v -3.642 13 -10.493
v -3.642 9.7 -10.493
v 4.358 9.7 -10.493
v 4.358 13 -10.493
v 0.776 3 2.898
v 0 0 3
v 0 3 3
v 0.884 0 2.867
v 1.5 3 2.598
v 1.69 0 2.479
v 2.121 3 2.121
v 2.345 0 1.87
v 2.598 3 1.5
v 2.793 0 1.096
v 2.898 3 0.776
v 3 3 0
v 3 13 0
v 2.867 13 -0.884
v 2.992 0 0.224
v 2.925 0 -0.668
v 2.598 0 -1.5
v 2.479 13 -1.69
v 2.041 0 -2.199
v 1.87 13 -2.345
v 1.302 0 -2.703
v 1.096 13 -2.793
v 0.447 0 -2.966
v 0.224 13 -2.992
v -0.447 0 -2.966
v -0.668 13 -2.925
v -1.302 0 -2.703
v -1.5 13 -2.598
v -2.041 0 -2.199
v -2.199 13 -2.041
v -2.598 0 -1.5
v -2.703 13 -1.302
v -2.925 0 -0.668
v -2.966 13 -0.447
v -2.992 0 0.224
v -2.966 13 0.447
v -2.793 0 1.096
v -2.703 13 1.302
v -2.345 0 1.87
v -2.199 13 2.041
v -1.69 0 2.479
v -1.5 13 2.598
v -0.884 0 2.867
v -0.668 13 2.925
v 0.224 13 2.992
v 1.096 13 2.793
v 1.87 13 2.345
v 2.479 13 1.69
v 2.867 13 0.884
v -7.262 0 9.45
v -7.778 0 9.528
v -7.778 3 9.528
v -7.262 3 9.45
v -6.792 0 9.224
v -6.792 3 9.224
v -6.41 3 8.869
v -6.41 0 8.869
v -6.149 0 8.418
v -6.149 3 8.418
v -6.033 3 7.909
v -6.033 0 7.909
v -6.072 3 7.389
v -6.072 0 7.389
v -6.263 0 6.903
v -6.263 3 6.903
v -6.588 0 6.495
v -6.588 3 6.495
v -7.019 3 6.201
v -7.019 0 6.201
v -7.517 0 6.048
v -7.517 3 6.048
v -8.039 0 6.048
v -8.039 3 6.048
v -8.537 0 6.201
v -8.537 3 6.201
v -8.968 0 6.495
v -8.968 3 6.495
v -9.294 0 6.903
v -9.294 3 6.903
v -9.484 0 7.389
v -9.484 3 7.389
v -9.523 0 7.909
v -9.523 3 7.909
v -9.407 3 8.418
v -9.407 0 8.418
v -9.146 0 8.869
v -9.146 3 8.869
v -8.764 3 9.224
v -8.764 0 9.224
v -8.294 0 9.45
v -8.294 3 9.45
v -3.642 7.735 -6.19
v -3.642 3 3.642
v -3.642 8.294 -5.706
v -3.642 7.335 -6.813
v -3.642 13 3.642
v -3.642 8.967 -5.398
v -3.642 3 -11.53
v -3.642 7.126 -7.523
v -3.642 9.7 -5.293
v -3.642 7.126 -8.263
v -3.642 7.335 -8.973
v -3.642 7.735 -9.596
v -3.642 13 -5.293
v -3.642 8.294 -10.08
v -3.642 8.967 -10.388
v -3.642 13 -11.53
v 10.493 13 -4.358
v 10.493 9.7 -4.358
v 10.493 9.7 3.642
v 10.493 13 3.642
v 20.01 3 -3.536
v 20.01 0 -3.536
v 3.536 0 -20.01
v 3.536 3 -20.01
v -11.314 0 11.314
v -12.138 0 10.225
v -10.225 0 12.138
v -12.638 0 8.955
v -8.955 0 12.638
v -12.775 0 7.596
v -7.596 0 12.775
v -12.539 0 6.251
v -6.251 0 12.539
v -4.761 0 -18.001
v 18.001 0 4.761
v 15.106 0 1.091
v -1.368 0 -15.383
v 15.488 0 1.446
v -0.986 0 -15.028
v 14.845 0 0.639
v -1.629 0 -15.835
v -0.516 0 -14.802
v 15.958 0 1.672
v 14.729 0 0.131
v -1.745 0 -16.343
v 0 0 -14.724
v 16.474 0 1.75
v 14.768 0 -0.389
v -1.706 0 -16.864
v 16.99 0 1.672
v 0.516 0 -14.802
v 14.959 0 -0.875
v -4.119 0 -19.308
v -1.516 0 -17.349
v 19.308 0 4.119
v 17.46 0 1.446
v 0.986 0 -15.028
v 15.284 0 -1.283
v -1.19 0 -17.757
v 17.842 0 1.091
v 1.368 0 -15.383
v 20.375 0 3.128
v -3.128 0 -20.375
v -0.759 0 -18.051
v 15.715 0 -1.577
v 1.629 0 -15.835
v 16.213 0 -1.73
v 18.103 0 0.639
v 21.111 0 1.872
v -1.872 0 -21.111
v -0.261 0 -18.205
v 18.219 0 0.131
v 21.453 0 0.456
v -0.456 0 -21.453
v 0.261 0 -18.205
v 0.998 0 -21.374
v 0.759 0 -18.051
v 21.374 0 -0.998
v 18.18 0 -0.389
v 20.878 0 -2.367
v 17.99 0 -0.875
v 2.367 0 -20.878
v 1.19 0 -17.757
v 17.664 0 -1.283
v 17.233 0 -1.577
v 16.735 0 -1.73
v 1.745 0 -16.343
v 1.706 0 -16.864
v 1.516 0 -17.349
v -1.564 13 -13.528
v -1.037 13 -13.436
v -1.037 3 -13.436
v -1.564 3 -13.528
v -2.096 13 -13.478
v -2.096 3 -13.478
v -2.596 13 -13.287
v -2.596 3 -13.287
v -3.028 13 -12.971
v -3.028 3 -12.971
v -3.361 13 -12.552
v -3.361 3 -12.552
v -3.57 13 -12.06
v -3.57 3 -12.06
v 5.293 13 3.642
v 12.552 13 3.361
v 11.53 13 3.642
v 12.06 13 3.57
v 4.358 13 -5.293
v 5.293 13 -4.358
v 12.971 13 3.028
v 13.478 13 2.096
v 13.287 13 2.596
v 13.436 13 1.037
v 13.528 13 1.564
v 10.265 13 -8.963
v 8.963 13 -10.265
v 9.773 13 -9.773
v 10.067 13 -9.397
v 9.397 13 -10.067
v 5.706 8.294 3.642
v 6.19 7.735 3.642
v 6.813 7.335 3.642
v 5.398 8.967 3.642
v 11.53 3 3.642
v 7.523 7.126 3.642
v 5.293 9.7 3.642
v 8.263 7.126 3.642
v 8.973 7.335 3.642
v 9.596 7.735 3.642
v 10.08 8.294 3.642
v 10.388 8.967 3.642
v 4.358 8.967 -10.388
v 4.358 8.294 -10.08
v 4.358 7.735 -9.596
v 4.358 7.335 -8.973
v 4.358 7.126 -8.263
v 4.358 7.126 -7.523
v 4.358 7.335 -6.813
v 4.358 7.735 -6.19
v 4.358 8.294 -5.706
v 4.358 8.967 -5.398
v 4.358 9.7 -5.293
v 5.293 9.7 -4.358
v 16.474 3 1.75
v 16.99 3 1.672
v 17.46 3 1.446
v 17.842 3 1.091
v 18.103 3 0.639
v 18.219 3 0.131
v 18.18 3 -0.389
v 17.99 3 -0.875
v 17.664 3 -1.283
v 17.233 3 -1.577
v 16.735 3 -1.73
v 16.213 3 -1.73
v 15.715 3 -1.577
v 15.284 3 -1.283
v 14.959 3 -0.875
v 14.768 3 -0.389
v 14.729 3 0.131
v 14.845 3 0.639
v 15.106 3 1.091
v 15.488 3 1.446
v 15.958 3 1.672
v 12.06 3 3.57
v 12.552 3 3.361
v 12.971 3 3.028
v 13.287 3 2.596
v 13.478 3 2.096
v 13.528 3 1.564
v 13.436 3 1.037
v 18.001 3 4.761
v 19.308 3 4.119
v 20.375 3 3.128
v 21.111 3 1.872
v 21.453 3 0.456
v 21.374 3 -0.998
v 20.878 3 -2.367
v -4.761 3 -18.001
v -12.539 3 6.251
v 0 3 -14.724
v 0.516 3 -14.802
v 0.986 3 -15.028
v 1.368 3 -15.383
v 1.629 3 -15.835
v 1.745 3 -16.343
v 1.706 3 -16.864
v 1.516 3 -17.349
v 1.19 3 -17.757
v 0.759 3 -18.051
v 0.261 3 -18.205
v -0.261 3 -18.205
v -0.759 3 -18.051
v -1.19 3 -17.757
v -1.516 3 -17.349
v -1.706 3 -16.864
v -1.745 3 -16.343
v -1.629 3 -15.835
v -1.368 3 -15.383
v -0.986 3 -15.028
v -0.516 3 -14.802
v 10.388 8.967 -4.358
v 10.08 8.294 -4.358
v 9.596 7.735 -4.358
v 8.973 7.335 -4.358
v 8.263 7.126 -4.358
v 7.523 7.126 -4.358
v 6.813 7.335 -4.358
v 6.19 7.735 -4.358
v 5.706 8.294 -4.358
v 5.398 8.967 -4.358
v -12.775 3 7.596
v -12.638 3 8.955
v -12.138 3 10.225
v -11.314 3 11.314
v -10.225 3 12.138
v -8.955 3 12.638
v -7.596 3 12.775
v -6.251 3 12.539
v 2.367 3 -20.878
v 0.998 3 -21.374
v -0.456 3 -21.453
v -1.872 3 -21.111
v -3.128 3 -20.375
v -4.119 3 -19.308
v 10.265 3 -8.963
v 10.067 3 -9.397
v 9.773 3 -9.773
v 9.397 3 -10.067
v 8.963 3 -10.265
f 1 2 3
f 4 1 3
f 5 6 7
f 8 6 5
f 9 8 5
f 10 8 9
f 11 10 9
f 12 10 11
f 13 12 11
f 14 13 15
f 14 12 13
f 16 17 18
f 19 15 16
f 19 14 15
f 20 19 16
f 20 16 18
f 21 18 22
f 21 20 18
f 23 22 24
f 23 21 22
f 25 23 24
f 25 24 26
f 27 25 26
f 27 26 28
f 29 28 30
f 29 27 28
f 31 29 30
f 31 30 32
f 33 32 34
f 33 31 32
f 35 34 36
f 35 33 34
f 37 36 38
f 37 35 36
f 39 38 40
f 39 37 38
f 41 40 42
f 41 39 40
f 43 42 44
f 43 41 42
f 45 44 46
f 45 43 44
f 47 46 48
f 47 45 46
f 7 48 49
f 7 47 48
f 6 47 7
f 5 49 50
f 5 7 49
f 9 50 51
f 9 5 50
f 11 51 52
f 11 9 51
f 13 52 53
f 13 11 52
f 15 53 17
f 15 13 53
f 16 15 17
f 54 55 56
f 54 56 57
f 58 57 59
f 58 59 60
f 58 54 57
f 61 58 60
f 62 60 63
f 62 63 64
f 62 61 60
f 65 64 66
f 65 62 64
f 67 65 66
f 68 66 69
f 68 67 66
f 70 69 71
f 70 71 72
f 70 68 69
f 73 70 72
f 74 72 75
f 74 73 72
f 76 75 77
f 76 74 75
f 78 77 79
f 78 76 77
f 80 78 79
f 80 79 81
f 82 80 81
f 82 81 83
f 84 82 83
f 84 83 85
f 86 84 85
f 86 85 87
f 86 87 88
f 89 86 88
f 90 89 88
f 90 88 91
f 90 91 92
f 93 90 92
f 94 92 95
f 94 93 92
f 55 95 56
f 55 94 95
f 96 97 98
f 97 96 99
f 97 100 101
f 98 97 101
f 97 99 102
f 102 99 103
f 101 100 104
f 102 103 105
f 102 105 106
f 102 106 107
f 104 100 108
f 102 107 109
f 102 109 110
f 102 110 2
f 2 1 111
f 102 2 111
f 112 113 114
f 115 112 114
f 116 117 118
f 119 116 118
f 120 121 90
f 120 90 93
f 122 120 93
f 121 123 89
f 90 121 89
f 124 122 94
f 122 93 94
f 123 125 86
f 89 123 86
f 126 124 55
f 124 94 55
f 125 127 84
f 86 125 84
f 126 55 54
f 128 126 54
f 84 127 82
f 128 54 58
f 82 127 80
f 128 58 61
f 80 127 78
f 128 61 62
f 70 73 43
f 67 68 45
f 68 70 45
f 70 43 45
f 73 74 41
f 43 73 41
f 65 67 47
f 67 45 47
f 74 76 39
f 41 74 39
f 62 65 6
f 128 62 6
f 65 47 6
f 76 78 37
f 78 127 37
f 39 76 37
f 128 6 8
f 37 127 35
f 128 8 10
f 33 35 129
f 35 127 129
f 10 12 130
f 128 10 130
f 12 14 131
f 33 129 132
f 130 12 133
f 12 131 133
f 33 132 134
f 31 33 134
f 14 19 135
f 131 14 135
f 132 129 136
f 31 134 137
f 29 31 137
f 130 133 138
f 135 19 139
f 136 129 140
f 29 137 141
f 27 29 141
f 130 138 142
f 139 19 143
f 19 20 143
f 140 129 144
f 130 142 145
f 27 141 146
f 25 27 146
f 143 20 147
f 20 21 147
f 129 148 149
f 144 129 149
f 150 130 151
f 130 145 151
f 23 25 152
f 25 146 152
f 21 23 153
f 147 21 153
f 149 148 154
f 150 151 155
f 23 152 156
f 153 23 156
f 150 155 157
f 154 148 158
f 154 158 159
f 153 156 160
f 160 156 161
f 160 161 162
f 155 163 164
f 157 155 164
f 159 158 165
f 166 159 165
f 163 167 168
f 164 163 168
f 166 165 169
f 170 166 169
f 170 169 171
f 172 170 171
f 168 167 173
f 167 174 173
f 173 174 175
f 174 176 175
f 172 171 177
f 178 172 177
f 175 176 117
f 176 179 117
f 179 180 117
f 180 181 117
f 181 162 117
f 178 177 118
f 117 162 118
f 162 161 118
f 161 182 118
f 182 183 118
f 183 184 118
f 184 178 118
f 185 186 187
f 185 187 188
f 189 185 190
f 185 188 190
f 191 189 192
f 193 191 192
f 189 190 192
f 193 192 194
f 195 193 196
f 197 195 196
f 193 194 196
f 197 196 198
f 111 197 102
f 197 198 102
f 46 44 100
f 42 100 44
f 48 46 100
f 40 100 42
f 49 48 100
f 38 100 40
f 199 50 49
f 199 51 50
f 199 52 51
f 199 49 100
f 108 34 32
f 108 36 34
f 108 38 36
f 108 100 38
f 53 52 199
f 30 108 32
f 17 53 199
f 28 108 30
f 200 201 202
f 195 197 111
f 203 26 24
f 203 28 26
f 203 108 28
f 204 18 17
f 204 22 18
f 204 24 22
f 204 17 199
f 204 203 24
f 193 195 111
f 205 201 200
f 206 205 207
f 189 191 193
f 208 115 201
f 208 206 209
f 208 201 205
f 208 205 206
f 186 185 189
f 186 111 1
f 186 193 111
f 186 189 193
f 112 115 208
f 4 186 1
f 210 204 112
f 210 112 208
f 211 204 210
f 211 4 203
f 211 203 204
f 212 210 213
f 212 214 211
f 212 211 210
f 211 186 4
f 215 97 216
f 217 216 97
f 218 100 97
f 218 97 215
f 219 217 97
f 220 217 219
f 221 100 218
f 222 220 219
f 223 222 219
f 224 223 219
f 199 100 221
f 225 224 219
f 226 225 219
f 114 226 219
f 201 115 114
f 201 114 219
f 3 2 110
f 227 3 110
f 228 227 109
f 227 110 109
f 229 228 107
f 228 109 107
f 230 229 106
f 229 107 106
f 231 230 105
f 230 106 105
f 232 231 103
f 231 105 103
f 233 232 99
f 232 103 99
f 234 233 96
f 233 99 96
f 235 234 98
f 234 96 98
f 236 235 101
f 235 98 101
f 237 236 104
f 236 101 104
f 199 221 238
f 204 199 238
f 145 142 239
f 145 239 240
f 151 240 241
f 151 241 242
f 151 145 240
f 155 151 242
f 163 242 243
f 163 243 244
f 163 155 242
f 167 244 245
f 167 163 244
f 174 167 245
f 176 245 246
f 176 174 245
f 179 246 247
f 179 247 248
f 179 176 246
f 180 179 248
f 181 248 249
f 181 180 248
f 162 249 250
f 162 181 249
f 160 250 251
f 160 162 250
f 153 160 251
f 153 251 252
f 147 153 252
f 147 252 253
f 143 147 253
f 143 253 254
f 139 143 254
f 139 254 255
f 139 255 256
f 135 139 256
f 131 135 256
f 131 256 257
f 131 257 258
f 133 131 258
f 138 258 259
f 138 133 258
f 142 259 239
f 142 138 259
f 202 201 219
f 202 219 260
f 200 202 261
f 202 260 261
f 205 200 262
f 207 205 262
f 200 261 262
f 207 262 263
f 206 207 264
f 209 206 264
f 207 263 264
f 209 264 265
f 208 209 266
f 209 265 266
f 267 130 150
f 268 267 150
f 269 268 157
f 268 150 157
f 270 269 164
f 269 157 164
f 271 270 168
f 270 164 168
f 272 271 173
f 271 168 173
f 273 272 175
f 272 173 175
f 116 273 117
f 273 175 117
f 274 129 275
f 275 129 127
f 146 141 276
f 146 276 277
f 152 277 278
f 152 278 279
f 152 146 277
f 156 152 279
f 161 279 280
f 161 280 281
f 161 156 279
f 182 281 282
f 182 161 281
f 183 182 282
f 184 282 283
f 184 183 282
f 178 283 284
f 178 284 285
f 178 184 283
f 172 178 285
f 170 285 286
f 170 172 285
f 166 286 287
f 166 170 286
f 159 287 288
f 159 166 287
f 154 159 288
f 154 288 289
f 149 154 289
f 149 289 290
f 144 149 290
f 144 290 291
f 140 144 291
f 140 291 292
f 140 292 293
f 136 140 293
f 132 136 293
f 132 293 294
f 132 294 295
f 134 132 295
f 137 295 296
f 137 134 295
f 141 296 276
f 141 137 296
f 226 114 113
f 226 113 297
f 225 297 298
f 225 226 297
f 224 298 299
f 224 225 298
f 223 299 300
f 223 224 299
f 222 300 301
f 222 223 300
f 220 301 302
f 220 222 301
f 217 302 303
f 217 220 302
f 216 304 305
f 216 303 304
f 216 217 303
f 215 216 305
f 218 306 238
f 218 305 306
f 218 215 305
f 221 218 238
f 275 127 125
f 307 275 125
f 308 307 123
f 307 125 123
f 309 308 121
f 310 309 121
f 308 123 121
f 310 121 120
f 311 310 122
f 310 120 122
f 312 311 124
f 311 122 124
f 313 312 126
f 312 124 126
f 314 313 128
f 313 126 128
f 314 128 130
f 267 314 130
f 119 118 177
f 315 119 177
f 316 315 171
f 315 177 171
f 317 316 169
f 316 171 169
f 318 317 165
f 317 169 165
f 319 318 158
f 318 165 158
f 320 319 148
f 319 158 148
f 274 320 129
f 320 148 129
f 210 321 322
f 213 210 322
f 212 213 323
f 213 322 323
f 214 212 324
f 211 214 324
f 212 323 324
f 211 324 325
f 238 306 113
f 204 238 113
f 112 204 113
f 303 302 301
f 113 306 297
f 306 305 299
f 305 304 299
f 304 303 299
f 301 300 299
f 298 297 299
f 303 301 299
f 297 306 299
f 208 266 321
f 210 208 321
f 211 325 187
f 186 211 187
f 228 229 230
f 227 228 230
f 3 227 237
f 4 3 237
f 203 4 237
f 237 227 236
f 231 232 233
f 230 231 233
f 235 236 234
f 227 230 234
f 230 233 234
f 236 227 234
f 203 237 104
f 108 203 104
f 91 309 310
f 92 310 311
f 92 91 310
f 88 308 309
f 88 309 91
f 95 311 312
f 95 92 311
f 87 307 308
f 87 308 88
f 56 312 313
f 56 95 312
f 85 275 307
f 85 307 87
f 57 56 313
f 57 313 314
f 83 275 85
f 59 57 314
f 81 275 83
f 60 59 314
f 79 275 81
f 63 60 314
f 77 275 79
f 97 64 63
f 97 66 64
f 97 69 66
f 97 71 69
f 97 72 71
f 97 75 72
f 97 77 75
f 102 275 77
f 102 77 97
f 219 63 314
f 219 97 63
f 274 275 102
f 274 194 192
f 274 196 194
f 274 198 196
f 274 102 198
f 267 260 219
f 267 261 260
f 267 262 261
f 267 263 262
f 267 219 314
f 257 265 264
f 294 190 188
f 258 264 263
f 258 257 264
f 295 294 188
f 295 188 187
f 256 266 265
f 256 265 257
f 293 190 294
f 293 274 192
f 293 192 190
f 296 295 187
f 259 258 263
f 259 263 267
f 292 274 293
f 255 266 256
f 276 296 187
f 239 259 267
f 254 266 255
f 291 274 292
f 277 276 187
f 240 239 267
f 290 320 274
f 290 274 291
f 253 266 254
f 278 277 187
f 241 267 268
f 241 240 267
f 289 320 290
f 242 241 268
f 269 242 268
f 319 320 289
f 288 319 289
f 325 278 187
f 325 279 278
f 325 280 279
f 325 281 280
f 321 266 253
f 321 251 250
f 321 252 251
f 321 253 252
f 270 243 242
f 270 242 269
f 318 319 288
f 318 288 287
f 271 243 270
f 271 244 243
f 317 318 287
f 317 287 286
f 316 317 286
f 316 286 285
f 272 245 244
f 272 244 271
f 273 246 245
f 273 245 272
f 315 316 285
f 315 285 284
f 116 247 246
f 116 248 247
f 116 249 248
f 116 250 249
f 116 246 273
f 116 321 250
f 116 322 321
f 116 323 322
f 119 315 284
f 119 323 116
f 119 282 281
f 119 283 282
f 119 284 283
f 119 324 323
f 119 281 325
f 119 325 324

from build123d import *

# Parameters (mm, degrees)
SKETCH_1_R      = 3
SKETCH_1_R_2    = 1.75
EXTRUDE_1_DEPTH = 3
SKETCH_4_R      = 3
EXTRUDE_3_DEPTH = 10
EXTRUDE_5_REACH = 37.51


with BuildPart() as part:
    # 草图1 → 凸台-拉伸1 (new body)
    with BuildSketch(Plane(origin=(0, 0, 0), x_dir=(1, 0, 0), z_dir=(0, 1, 0))):
        with BuildLine():
            Line((-6.251193562, -12.539301448), (18.001154819, -4.761126855))
            ThreePointArc((18.001154819, -4.761126855), (21.333794073, -1.176473834), (20.009707694, 3.535533906))
            Line((20.009707694, 3.535533906), (3.535533906, 20.009707694))
            ThreePointArc((3.535533906, 20.009707694), (-1.176473834, 21.333794073), (-4.761126855, 18.001154819))
            Line((-4.761126855, 18.001154819), (-12.539301448, -6.251193562))
            ThreePointArc((-12.539301448, -6.251193562), (-11.313708499, -11.313708499), (-6.251193562, -12.539301448))
        make_face()
        with Locations(Location((0, 0, 0), (0, 0, 270))):
            Circle(SKETCH_1_R, mode=Mode.SUBTRACT)
        with Locations(Location((0, 16.474173788, 0), (0, 0, 270))):
            Circle(SKETCH_1_R_2, mode=Mode.SUBTRACT)
        with Locations(Location((16.474173788, 0, 0), (0, 0, 270))):
            Circle(SKETCH_1_R_2, mode=Mode.SUBTRACT)
        with Locations(Location((-7.778174593, -7.778174593, 0), (0, 0, 270))):
            Circle(SKETCH_1_R_2, mode=Mode.SUBTRACT)
    extrude(amount=EXTRUDE_1_DEPTH)

    # 草图4 → 凸台-拉伸3 (add)
    with BuildSketch(Plane(origin=(0, 3, 0), x_dir=(1, 0, 0), z_dir=(0, 1, 0))):
        with BuildLine():
            ThreePointArc((-1.03695933, 13.436395181), (-2.822849114, 13.143867789), (-3.641592762, 11.529980113))
            Line((-3.641592762, 11.529980113), (-3.641592762, 10.493))
            Line((-3.641592762, 10.493), (4.358407238, 10.493))
            Line((4.358407238, 10.493), (4.358407238, 5.293))
            Line((4.358407238, 5.293), (-3.641592762, 5.293))
            Line((-3.641592762, 5.293), (-3.641592762, -3.641592762))
            Line((-3.641592762, -3.641592762), (5.293, -3.641592762))
            Line((5.293, -3.641592762), (5.293, 4.358407238))
            Line((5.293, 4.358407238), (10.493, 4.358407238))
            Line((10.493, 4.358407238), (10.493, -3.641592762))
            Line((10.493, -3.641592762), (11.529980113, -3.641592762))
            ThreePointArc((11.529980113, -3.641592762), (13.143867789, -2.822849114), (13.436395181, -1.03695933))
            Line((13.436395181, -1.03695933), (10.264822306, 8.96304067))
            ThreePointArc((10.264822306, 8.96304067), (9.7726208, 9.7726208), (8.96304067, 10.264822306))
            Line((8.96304067, 10.264822306), (-1.03695933, 13.436395181))
        make_face()
        Circle(SKETCH_4_R, mode=Mode.SUBTRACT)
    extrude(amount=EXTRUDE_3_DEPTH)

    # 草图8 → 凸台-拉伸5 (add, up to next)
    with BuildSketch(Plane.XY.offset(3.641592762), mode=Mode.PRIVATE) as extrude_5_sk1:
        with BuildLine():
            ThreePointArc((10.493, 9.7), (7.893, 7.1), (5.293, 9.7))
            Line((5.293, 9.7), (5.293, 3))
            Line((5.293, 3), (10.493, 3))
            Line((10.493, 3), (10.493, 9.7))
        make_face()
    extrude_5_tool1 = extrude(extrude_5_sk1.sketch, amount=-EXTRUDE_5_REACH, mode=Mode.PRIVATE) - part.part
    extrude_5 = extrude_5_tool1.solids().sort_by_distance((7.893, 5.365131, 3.641593))[0]
    add(extrude_5)

    # 镜向7: 凸台-拉伸5 across plane
    add(extrude_5.mirror(Plane(origin=(0, 0, 0), x_dir=(-0.7071067811865476, 0, 0.7071067811865475), z_dir=(0.7071067811865475, 0, 0.7071067811865476))))


solid = part.part
